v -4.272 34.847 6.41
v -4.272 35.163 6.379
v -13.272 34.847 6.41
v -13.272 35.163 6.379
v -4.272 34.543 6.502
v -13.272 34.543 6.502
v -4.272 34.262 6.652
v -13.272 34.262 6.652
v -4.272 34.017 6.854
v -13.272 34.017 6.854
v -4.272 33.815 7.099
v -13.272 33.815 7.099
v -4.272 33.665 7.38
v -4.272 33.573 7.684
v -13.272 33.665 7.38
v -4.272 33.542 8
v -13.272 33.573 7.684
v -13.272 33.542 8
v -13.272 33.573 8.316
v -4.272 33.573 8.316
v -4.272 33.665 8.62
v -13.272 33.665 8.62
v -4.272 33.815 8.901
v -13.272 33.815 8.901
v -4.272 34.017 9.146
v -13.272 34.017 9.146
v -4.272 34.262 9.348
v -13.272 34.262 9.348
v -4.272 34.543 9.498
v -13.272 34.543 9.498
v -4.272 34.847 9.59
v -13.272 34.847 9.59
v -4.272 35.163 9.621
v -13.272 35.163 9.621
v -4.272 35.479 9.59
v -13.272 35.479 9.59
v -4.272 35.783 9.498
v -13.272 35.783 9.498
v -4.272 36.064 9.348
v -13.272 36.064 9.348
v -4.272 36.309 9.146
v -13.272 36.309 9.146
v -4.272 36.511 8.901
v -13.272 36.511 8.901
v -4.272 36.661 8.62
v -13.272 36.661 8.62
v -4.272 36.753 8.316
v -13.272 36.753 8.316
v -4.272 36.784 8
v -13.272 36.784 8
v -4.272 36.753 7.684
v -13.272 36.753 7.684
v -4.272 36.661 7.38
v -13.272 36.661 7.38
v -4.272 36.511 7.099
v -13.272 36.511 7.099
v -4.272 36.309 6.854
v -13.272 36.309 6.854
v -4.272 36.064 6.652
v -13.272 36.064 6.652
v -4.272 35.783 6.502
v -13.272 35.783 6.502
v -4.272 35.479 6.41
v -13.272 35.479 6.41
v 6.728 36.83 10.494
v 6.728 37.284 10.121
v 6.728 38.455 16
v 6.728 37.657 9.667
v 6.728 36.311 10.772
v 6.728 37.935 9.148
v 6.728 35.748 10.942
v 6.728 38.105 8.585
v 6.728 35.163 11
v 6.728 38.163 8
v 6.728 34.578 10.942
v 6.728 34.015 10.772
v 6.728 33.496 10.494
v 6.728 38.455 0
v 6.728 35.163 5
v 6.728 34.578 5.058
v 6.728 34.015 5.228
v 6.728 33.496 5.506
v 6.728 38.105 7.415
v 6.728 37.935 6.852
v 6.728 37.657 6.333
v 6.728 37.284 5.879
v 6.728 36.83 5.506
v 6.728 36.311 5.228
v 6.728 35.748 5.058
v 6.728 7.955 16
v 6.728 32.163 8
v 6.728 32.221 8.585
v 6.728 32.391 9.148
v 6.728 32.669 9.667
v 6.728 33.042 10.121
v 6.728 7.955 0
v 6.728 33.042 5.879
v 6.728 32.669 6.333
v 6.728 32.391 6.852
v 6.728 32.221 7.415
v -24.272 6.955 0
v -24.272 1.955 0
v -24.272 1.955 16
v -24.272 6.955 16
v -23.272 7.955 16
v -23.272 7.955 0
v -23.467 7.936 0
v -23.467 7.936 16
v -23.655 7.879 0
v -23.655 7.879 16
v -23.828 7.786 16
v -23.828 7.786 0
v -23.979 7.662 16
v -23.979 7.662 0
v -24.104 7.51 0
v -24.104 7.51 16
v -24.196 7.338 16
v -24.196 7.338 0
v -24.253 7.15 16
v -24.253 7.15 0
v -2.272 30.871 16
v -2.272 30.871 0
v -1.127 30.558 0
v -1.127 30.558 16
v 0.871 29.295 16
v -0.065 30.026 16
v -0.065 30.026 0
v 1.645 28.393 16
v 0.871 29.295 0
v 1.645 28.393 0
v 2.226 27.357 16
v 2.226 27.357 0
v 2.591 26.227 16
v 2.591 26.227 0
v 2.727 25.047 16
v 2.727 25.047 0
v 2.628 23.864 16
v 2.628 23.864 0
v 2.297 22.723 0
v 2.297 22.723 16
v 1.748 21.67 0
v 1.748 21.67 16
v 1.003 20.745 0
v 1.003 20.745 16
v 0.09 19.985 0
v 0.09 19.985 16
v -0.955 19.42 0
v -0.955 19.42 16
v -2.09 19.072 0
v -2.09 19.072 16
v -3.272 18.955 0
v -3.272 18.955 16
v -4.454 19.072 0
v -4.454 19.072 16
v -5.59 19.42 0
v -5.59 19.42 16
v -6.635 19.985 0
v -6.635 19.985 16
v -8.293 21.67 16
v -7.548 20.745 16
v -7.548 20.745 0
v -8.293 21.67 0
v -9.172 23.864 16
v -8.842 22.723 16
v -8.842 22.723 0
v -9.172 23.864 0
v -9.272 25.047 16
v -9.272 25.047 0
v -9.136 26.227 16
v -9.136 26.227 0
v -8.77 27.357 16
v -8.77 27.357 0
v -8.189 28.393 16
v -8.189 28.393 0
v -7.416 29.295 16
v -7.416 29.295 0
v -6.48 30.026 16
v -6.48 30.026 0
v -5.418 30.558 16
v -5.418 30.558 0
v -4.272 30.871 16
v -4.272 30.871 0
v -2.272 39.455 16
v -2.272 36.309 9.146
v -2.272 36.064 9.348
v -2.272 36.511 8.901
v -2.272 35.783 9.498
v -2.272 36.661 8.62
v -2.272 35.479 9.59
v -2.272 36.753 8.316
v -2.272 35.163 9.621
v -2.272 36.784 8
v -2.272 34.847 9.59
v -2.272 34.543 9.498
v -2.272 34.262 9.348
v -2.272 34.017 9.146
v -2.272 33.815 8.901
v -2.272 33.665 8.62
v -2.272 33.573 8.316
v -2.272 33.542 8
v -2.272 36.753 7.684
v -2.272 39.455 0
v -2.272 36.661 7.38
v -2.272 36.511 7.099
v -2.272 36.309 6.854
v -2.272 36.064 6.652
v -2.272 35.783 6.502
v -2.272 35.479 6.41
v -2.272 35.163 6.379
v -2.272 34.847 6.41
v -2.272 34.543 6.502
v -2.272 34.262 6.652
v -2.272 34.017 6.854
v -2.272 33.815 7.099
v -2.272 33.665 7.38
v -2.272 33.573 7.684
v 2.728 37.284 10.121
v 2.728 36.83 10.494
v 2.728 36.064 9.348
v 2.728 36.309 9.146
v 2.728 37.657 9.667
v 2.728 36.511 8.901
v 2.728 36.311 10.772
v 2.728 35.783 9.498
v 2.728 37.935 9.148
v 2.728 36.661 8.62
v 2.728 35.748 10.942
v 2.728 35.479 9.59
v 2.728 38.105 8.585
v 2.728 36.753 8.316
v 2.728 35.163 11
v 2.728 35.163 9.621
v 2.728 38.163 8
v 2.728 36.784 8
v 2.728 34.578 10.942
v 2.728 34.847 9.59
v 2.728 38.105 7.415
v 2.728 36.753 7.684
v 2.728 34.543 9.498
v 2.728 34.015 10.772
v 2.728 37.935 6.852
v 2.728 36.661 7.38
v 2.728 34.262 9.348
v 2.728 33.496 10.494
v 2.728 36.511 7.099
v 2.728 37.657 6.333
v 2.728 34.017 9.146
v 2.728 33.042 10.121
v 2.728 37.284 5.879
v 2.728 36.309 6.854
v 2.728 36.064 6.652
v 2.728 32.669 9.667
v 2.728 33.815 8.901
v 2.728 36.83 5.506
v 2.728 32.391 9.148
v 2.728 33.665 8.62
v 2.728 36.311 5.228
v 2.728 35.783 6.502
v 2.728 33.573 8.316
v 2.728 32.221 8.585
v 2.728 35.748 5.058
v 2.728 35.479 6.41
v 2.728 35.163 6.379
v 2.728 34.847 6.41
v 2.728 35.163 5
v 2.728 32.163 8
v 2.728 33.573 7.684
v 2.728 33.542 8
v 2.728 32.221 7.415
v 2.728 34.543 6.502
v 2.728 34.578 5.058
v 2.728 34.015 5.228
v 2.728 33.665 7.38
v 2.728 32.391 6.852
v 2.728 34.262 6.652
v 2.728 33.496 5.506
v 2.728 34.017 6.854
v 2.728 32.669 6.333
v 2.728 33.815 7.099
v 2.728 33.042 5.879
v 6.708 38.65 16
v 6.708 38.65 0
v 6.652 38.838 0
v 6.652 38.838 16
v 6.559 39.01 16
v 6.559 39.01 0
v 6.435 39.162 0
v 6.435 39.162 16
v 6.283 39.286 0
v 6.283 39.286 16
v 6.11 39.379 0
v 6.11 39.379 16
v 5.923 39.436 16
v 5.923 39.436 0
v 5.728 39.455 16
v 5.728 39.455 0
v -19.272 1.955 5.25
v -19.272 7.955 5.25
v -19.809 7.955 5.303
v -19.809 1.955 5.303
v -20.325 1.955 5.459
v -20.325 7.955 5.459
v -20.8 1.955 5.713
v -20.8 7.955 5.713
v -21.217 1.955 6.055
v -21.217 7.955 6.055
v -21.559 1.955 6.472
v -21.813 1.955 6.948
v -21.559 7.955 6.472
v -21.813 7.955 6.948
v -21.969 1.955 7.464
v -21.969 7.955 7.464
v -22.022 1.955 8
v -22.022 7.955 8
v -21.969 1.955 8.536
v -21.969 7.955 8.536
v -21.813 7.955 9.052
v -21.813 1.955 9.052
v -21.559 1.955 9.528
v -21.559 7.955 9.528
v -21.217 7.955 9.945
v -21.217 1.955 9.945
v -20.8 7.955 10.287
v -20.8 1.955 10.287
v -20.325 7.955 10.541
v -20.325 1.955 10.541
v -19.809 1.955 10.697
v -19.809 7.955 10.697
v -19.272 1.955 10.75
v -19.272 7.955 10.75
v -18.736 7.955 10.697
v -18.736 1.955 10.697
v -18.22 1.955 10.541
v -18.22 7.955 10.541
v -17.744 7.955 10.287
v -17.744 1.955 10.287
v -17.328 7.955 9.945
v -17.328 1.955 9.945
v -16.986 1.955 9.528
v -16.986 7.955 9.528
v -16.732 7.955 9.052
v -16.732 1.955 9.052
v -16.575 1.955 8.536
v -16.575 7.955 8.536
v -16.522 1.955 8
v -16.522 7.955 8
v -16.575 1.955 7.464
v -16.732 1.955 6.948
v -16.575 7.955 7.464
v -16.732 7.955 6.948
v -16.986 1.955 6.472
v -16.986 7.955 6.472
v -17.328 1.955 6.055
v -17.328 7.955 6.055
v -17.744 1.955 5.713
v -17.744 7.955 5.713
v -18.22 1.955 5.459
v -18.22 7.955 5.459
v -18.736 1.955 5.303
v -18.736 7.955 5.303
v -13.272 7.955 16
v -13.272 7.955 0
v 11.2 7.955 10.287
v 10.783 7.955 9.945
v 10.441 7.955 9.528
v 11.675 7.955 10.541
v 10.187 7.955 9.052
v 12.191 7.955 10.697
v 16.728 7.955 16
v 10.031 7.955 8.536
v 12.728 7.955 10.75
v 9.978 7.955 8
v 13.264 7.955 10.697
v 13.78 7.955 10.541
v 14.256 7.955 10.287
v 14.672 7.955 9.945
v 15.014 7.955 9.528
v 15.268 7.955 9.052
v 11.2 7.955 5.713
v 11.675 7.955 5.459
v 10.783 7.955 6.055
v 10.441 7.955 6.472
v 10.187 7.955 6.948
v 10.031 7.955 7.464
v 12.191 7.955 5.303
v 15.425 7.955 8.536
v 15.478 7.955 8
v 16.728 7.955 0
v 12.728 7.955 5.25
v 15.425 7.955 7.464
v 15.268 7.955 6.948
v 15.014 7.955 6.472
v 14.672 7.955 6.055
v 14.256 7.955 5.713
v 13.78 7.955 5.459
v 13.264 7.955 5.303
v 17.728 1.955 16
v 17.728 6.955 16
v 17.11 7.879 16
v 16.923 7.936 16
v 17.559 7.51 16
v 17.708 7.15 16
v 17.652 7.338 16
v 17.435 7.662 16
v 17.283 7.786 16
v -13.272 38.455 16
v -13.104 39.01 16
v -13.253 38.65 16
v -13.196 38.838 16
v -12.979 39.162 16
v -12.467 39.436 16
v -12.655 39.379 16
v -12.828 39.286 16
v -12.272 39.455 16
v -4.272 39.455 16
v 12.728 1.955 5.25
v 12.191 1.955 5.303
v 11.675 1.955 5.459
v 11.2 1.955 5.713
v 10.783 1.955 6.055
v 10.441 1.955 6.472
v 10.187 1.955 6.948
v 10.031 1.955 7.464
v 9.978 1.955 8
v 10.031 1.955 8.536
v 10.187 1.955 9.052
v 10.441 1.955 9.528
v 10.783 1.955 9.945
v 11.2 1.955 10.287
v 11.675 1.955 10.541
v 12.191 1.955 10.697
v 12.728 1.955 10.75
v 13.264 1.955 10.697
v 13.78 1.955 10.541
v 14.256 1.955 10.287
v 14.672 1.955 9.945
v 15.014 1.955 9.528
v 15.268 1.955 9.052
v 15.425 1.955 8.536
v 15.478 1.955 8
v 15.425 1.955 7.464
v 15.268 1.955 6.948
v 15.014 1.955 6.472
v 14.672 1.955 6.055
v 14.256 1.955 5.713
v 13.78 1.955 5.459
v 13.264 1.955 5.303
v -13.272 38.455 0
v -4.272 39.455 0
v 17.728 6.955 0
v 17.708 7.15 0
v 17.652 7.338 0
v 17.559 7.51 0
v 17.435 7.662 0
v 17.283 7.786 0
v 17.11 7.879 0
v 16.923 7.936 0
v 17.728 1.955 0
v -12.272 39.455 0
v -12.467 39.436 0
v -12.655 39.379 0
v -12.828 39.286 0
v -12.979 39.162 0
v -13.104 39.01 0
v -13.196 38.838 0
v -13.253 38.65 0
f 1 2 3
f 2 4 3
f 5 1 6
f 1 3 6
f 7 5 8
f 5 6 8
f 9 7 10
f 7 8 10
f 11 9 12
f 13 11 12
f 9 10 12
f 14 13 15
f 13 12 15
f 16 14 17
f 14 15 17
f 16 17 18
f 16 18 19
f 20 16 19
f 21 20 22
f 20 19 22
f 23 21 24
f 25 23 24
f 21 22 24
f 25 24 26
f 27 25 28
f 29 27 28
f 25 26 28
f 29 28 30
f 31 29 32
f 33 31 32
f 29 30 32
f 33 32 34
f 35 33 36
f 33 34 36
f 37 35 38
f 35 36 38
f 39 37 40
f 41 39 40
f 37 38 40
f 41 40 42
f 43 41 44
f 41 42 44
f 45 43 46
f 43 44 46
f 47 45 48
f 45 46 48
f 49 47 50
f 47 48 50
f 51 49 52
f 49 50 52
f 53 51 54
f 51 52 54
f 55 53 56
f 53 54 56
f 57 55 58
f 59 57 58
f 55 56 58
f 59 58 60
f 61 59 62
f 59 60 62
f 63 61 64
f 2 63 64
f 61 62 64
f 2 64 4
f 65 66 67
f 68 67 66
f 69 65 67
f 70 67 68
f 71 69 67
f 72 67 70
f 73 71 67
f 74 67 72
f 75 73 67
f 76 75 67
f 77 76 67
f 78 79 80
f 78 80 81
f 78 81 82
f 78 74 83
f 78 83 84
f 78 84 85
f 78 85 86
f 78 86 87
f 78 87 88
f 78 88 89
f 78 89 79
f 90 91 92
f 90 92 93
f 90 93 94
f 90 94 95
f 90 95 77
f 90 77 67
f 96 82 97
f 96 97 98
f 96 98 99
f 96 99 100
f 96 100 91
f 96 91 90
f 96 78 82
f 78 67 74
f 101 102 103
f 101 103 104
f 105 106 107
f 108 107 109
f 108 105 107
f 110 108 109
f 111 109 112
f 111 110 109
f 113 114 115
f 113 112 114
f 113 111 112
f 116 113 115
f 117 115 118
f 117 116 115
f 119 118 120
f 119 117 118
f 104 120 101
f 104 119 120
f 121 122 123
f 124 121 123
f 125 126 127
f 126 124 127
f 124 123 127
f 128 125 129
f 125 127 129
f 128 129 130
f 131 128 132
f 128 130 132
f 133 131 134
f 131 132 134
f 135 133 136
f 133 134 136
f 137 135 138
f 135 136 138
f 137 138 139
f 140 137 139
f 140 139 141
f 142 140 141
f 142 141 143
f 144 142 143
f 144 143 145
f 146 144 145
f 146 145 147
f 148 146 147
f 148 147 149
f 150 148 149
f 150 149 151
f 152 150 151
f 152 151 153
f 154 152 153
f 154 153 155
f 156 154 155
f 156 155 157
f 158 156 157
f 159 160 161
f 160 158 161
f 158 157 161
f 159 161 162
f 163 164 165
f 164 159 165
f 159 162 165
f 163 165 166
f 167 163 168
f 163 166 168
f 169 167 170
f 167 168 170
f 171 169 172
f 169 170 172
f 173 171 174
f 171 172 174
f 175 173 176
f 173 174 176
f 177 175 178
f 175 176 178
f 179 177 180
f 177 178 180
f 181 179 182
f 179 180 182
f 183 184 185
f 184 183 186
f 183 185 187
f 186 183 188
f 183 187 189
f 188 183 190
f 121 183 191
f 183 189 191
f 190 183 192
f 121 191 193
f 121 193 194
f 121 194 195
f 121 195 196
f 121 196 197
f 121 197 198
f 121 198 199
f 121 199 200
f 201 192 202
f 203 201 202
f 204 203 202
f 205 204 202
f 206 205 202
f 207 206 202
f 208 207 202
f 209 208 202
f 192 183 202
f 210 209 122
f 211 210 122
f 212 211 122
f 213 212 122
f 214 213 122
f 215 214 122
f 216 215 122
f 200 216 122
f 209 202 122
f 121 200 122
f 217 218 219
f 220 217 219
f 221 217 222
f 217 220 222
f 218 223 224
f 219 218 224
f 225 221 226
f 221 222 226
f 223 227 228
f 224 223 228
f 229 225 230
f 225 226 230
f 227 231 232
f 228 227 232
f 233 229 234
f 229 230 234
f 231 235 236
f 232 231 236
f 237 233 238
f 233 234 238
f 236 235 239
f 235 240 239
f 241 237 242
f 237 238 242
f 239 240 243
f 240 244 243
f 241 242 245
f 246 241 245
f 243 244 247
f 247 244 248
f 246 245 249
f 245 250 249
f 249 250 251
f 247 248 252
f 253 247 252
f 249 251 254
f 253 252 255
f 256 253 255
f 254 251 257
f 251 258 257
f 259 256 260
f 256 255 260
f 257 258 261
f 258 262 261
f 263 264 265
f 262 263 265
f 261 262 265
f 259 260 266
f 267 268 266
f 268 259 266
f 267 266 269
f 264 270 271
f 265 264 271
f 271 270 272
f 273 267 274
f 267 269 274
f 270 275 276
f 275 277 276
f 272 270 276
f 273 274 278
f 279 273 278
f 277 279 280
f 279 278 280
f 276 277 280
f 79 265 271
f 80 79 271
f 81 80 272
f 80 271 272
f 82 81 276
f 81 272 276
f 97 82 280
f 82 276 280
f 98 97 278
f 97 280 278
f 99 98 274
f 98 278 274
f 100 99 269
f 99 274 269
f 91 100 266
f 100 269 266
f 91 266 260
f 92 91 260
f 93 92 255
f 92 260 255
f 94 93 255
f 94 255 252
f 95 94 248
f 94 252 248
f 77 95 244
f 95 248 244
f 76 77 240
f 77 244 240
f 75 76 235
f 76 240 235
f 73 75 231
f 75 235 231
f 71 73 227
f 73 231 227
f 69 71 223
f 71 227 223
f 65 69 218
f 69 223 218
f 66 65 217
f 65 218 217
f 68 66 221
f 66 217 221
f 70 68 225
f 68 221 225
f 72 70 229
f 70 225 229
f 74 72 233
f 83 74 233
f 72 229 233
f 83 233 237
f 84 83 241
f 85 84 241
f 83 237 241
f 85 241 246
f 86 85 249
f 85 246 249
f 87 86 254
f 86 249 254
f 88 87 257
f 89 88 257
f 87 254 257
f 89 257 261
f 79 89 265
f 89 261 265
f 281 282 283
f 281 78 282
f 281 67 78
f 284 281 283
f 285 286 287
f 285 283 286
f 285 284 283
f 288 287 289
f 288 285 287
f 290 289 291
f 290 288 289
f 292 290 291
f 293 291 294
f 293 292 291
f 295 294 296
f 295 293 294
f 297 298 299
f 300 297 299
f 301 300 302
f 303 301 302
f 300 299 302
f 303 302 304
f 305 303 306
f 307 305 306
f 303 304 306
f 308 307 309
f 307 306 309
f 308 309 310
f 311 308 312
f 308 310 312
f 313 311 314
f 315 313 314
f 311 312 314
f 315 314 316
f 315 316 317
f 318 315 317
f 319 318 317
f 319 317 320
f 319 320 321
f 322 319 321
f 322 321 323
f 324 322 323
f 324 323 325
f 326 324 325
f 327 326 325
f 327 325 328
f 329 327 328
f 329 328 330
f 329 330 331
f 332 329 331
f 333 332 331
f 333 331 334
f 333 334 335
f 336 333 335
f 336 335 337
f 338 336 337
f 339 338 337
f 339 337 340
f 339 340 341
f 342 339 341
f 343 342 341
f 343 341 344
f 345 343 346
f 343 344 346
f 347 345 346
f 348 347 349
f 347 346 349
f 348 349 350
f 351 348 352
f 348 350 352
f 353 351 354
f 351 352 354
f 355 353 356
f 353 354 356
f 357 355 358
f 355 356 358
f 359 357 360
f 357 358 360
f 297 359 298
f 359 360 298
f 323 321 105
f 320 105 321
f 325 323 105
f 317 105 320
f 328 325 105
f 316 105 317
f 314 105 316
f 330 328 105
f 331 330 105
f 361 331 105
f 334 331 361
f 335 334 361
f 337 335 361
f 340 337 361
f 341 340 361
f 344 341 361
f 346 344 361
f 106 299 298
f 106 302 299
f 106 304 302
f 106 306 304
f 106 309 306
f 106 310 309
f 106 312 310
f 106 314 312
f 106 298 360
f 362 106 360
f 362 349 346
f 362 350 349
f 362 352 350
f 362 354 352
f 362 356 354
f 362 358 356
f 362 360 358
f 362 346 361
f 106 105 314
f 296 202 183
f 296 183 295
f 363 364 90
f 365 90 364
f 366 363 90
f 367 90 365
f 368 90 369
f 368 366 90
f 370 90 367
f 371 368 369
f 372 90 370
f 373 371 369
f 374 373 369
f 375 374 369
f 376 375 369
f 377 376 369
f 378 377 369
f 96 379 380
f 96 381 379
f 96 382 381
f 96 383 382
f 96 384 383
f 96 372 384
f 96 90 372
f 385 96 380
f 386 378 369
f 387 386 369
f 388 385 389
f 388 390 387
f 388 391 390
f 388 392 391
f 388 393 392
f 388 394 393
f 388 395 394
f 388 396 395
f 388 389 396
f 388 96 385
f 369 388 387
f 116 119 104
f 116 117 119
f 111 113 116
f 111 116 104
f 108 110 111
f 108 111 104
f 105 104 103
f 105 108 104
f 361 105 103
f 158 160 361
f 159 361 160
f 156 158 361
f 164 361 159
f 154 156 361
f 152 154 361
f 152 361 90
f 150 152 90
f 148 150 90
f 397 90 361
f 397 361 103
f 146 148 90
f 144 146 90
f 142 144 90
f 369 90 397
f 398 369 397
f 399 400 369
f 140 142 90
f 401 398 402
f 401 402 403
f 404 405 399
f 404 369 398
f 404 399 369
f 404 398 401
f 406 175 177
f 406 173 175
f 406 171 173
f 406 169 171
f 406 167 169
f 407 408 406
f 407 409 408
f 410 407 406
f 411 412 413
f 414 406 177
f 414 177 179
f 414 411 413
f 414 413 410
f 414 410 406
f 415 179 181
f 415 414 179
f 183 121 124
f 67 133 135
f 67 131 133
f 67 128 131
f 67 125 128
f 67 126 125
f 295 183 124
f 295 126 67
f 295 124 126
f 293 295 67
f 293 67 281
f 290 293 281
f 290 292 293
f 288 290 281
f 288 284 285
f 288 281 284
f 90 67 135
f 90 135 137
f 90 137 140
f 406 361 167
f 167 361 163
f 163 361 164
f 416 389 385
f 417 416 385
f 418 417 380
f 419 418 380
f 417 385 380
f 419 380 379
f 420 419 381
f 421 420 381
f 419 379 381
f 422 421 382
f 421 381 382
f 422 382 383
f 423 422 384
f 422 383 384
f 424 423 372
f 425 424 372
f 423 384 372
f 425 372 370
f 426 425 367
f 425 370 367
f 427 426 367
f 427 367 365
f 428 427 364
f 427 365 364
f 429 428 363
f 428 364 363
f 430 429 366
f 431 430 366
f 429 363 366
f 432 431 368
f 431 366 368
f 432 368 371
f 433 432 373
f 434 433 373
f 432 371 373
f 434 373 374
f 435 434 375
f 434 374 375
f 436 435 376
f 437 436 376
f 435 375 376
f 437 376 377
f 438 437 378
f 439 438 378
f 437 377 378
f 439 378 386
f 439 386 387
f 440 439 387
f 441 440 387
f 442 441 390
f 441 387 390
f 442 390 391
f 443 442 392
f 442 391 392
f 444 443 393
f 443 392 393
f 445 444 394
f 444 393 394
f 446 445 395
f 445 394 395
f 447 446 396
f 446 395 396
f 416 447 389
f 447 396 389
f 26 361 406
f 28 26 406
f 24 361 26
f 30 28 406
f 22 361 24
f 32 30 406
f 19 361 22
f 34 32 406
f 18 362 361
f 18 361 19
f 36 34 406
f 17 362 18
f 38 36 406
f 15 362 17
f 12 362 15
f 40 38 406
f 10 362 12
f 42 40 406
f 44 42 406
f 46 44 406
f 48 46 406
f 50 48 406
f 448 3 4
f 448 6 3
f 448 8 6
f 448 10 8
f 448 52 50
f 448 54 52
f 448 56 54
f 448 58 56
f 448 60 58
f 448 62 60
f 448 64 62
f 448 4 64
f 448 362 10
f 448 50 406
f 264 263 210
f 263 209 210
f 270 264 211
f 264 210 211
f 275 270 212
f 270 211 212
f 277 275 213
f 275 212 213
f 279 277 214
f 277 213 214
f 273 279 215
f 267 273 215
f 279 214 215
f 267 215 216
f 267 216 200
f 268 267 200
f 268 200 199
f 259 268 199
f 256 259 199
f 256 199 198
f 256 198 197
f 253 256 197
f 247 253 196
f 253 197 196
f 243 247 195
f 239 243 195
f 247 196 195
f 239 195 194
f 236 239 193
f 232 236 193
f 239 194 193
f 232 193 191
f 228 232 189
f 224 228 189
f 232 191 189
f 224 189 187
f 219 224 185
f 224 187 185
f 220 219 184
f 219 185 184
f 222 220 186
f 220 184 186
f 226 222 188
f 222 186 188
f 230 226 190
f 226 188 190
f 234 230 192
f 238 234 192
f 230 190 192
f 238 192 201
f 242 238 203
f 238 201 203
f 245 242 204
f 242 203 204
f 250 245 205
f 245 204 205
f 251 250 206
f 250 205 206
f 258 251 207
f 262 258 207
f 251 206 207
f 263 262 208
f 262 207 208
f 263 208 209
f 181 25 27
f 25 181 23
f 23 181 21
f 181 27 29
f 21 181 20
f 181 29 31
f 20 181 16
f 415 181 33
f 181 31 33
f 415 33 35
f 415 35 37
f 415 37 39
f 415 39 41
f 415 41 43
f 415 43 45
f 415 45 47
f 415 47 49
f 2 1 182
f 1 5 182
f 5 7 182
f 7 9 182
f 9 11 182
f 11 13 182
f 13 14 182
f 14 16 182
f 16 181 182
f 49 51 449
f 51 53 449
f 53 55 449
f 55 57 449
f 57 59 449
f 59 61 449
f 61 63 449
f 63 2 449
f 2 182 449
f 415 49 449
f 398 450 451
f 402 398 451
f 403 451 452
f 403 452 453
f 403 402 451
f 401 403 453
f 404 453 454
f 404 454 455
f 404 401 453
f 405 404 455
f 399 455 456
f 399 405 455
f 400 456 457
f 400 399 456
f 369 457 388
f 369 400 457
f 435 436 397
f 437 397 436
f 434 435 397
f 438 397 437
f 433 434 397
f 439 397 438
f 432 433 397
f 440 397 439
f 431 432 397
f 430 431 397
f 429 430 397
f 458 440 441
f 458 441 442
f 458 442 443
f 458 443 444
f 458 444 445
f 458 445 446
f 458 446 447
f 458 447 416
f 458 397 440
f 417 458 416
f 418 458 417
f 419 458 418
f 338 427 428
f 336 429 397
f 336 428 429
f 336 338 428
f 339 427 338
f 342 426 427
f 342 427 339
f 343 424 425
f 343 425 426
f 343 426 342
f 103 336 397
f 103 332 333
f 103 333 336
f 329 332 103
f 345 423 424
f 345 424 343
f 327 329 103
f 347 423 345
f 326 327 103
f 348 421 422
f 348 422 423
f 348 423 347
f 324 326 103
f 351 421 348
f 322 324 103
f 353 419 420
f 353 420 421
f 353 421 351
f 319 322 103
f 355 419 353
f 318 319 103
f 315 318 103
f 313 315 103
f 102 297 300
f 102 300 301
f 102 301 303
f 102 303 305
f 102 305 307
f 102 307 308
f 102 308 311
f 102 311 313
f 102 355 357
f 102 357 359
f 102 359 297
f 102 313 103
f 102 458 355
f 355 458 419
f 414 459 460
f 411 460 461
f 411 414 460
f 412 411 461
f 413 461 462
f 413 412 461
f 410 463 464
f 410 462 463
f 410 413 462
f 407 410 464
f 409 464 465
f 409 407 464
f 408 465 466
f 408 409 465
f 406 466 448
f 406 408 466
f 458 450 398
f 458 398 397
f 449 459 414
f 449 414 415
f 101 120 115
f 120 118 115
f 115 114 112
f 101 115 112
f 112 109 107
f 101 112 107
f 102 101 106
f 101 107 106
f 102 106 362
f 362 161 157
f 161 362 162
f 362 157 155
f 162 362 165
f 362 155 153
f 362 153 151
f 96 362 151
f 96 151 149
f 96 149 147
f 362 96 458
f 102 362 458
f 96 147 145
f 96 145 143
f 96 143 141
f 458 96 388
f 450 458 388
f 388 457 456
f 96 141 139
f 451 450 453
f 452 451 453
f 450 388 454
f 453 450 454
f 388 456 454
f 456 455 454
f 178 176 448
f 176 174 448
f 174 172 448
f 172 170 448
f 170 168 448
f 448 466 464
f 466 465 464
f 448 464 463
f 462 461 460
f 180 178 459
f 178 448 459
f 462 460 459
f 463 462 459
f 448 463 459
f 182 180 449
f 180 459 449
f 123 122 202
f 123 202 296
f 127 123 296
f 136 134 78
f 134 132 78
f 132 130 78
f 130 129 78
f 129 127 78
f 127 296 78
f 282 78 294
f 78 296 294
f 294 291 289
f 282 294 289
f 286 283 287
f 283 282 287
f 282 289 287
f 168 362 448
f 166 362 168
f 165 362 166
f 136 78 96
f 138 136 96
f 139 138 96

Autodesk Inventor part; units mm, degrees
ref_plane "YZ Plane" through (0, 0, 0) normal (1, 0, 0) x (0, 1, 0)
ref_plane "XZ Plane" through (0, 0, 0) normal (0, 1, 0) x (-1, 0, 0)
ref_plane "XY Plane" through (0, 0, 0) normal (0, 0, 1) x (1, 0, 0)
sketch "Esboço1" plane through (0, 0, 0) normal (0, 0, 1) x (1, 0, 0)
  line L0 (17.7277, 1.9549) -> (-24.2723, 1.9549)
  line L1 (-24.2723, 1.9549) -> (-24.2723, 7.9549)
  line L2 (17.7277, 7.9549) -> (17.7277, 1.9549)
  line L3 (6.7277, 39.4549) -> (6.7277, 7.9549)
  line L4 (-13.2723, 7.9549) -> (-13.2723, 39.4549)
  arc A0 (-4.2723, 30.871) -> (-2.2723, 30.871) centre (-3.2723, 24.9549) ccw
  line L5 (-24.2723, 7.9549) -> (-13.2723, 7.9549)
  line L6 (6.7277, 7.9549) -> (17.7277, 7.9549)
  line L7 (-2.2723, 39.4549) -> (-2.2723, 30.871)
  line L8 (-4.2723, 30.871) -> (-4.2723, 39.4549)
  line L9 (-13.2723, 39.4549) -> (-4.2723, 39.4549)
  line L10 (-2.2723, 39.4549) -> (6.7277, 39.4549)
  dimension "largura" = 42
  dimension "largura_topo" = 20
  dimension "altura_base" = 6
  dimension "diametro" = 12
  dimension "altura_furo" = 23
  dimension "d6" = 11
  dimension "d7" = 10
  dimension "d8" = 6
  dimension "d10" = 9
  dimension "d11" = 9
  dimension "altura" = 37.5
  dimension "d33" = 37.5
extrude "Extrusão1" add sketch "Esboço1" along normal blind 16
sketch "Esboço2" plane through (6.7277, 7.9549, 0) normal (1, 0, 0) x (0, 0, -1)
  line L0 (0, 22.9161) -> (-16, 22.9161) projected
  line L1 (-8, 22.9161) -> (-8, 31.5) construction
  circle A0 centre (-8, 27.208) radius 1.1711 construction
  line L2 (0, 31.5) -> (-16, 31.5) projected
  point P0 (0, -7.9549)
hole "Furo1" at (6.7277, 35.163, 8) direction (-1, 0, 0) diameter 3.242 end through all counterbore diameter 6 counterbore depth 4 thread size "M4x0.7" class "6H" standard "ANSI Metric M Profile"
sketch "Esboço3" plane through (-24.2723, 1.9549, 0) normal (0, -1, 0) x (1, 0, 0)
  line L0 (5, 8) -> (37, 8) construction
  circle A0 centre (5, 8) radius 1 construction
  circle A1 centre (37, 8) radius 1 construction
  line L1 (42, 0) -> (0, 0) construction
  line L2 (21, 0) -> (21, 16) construction
  line L3 (0, 16) -> (42, 16) construction
  point P0 (21, 8)
  dimension "distancia_parafusos" = 32
  dimension "d22" = 2
  dimension "d23" = 2
hole "Furo2" at (-19.2723, 1.9549, 8) at (12.7277, 1.9549, 8) direction (0, 1, 0) diameter 5.5 end through all
fillet "Arredondamento1" radius 1 4 edges at (6.7277, 39.4549, 8) (-13.2723, 39.4549, 8) (-24.2723, 7.9549, 8) (17.7277, 7.9549, 8)
equation "\"d6\" = -0.5 * largura_topo + 0.5 * largura"
equation "\"d7\" = 0.5 * largura_topo"
equation "\"d8\" = altura_base"
equation "\"d11\" = d10"
equation "\"d33\" = altura"
properties part number "Sk12"
